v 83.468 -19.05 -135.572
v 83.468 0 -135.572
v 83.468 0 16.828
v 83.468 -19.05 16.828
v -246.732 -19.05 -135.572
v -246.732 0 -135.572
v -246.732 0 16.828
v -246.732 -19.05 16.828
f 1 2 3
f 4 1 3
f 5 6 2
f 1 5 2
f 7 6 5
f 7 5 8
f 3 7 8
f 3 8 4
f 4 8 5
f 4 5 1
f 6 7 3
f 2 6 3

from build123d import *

# Parameters (mm, degrees)
F0_W     = 381
F0_H     = 152.4
F1_DEPTH = 25.4
F3_W     = 330.2
F3_H     = 152.4
F4_DEPTH = 19.05


# Not quite as in the source:
# - a length typed as a fraction of an inch, garbled in the dataset ("3 / 203.2 mm" for 3/8 in), is restored


with BuildPart() as f1:
    # F0 (on Front) → F1 (new body)
    with BuildSketch(Plane.XZ):
        with Locations((-29.8060849309, -110.5314957584)):
            Rectangle(F0_W, F0_H)
    extrude(amount=F1_DEPTH)


with BuildPart() as f4:
    # F3 (on Front) → F4 (new body)
    with BuildSketch(Plane.XZ):
        with Locations((-81.6316027194, -59.3715892611)):
            Rectangle(F3_W, F3_H)
    extrude(amount=F4_DEPTH)


solid = f4.part
